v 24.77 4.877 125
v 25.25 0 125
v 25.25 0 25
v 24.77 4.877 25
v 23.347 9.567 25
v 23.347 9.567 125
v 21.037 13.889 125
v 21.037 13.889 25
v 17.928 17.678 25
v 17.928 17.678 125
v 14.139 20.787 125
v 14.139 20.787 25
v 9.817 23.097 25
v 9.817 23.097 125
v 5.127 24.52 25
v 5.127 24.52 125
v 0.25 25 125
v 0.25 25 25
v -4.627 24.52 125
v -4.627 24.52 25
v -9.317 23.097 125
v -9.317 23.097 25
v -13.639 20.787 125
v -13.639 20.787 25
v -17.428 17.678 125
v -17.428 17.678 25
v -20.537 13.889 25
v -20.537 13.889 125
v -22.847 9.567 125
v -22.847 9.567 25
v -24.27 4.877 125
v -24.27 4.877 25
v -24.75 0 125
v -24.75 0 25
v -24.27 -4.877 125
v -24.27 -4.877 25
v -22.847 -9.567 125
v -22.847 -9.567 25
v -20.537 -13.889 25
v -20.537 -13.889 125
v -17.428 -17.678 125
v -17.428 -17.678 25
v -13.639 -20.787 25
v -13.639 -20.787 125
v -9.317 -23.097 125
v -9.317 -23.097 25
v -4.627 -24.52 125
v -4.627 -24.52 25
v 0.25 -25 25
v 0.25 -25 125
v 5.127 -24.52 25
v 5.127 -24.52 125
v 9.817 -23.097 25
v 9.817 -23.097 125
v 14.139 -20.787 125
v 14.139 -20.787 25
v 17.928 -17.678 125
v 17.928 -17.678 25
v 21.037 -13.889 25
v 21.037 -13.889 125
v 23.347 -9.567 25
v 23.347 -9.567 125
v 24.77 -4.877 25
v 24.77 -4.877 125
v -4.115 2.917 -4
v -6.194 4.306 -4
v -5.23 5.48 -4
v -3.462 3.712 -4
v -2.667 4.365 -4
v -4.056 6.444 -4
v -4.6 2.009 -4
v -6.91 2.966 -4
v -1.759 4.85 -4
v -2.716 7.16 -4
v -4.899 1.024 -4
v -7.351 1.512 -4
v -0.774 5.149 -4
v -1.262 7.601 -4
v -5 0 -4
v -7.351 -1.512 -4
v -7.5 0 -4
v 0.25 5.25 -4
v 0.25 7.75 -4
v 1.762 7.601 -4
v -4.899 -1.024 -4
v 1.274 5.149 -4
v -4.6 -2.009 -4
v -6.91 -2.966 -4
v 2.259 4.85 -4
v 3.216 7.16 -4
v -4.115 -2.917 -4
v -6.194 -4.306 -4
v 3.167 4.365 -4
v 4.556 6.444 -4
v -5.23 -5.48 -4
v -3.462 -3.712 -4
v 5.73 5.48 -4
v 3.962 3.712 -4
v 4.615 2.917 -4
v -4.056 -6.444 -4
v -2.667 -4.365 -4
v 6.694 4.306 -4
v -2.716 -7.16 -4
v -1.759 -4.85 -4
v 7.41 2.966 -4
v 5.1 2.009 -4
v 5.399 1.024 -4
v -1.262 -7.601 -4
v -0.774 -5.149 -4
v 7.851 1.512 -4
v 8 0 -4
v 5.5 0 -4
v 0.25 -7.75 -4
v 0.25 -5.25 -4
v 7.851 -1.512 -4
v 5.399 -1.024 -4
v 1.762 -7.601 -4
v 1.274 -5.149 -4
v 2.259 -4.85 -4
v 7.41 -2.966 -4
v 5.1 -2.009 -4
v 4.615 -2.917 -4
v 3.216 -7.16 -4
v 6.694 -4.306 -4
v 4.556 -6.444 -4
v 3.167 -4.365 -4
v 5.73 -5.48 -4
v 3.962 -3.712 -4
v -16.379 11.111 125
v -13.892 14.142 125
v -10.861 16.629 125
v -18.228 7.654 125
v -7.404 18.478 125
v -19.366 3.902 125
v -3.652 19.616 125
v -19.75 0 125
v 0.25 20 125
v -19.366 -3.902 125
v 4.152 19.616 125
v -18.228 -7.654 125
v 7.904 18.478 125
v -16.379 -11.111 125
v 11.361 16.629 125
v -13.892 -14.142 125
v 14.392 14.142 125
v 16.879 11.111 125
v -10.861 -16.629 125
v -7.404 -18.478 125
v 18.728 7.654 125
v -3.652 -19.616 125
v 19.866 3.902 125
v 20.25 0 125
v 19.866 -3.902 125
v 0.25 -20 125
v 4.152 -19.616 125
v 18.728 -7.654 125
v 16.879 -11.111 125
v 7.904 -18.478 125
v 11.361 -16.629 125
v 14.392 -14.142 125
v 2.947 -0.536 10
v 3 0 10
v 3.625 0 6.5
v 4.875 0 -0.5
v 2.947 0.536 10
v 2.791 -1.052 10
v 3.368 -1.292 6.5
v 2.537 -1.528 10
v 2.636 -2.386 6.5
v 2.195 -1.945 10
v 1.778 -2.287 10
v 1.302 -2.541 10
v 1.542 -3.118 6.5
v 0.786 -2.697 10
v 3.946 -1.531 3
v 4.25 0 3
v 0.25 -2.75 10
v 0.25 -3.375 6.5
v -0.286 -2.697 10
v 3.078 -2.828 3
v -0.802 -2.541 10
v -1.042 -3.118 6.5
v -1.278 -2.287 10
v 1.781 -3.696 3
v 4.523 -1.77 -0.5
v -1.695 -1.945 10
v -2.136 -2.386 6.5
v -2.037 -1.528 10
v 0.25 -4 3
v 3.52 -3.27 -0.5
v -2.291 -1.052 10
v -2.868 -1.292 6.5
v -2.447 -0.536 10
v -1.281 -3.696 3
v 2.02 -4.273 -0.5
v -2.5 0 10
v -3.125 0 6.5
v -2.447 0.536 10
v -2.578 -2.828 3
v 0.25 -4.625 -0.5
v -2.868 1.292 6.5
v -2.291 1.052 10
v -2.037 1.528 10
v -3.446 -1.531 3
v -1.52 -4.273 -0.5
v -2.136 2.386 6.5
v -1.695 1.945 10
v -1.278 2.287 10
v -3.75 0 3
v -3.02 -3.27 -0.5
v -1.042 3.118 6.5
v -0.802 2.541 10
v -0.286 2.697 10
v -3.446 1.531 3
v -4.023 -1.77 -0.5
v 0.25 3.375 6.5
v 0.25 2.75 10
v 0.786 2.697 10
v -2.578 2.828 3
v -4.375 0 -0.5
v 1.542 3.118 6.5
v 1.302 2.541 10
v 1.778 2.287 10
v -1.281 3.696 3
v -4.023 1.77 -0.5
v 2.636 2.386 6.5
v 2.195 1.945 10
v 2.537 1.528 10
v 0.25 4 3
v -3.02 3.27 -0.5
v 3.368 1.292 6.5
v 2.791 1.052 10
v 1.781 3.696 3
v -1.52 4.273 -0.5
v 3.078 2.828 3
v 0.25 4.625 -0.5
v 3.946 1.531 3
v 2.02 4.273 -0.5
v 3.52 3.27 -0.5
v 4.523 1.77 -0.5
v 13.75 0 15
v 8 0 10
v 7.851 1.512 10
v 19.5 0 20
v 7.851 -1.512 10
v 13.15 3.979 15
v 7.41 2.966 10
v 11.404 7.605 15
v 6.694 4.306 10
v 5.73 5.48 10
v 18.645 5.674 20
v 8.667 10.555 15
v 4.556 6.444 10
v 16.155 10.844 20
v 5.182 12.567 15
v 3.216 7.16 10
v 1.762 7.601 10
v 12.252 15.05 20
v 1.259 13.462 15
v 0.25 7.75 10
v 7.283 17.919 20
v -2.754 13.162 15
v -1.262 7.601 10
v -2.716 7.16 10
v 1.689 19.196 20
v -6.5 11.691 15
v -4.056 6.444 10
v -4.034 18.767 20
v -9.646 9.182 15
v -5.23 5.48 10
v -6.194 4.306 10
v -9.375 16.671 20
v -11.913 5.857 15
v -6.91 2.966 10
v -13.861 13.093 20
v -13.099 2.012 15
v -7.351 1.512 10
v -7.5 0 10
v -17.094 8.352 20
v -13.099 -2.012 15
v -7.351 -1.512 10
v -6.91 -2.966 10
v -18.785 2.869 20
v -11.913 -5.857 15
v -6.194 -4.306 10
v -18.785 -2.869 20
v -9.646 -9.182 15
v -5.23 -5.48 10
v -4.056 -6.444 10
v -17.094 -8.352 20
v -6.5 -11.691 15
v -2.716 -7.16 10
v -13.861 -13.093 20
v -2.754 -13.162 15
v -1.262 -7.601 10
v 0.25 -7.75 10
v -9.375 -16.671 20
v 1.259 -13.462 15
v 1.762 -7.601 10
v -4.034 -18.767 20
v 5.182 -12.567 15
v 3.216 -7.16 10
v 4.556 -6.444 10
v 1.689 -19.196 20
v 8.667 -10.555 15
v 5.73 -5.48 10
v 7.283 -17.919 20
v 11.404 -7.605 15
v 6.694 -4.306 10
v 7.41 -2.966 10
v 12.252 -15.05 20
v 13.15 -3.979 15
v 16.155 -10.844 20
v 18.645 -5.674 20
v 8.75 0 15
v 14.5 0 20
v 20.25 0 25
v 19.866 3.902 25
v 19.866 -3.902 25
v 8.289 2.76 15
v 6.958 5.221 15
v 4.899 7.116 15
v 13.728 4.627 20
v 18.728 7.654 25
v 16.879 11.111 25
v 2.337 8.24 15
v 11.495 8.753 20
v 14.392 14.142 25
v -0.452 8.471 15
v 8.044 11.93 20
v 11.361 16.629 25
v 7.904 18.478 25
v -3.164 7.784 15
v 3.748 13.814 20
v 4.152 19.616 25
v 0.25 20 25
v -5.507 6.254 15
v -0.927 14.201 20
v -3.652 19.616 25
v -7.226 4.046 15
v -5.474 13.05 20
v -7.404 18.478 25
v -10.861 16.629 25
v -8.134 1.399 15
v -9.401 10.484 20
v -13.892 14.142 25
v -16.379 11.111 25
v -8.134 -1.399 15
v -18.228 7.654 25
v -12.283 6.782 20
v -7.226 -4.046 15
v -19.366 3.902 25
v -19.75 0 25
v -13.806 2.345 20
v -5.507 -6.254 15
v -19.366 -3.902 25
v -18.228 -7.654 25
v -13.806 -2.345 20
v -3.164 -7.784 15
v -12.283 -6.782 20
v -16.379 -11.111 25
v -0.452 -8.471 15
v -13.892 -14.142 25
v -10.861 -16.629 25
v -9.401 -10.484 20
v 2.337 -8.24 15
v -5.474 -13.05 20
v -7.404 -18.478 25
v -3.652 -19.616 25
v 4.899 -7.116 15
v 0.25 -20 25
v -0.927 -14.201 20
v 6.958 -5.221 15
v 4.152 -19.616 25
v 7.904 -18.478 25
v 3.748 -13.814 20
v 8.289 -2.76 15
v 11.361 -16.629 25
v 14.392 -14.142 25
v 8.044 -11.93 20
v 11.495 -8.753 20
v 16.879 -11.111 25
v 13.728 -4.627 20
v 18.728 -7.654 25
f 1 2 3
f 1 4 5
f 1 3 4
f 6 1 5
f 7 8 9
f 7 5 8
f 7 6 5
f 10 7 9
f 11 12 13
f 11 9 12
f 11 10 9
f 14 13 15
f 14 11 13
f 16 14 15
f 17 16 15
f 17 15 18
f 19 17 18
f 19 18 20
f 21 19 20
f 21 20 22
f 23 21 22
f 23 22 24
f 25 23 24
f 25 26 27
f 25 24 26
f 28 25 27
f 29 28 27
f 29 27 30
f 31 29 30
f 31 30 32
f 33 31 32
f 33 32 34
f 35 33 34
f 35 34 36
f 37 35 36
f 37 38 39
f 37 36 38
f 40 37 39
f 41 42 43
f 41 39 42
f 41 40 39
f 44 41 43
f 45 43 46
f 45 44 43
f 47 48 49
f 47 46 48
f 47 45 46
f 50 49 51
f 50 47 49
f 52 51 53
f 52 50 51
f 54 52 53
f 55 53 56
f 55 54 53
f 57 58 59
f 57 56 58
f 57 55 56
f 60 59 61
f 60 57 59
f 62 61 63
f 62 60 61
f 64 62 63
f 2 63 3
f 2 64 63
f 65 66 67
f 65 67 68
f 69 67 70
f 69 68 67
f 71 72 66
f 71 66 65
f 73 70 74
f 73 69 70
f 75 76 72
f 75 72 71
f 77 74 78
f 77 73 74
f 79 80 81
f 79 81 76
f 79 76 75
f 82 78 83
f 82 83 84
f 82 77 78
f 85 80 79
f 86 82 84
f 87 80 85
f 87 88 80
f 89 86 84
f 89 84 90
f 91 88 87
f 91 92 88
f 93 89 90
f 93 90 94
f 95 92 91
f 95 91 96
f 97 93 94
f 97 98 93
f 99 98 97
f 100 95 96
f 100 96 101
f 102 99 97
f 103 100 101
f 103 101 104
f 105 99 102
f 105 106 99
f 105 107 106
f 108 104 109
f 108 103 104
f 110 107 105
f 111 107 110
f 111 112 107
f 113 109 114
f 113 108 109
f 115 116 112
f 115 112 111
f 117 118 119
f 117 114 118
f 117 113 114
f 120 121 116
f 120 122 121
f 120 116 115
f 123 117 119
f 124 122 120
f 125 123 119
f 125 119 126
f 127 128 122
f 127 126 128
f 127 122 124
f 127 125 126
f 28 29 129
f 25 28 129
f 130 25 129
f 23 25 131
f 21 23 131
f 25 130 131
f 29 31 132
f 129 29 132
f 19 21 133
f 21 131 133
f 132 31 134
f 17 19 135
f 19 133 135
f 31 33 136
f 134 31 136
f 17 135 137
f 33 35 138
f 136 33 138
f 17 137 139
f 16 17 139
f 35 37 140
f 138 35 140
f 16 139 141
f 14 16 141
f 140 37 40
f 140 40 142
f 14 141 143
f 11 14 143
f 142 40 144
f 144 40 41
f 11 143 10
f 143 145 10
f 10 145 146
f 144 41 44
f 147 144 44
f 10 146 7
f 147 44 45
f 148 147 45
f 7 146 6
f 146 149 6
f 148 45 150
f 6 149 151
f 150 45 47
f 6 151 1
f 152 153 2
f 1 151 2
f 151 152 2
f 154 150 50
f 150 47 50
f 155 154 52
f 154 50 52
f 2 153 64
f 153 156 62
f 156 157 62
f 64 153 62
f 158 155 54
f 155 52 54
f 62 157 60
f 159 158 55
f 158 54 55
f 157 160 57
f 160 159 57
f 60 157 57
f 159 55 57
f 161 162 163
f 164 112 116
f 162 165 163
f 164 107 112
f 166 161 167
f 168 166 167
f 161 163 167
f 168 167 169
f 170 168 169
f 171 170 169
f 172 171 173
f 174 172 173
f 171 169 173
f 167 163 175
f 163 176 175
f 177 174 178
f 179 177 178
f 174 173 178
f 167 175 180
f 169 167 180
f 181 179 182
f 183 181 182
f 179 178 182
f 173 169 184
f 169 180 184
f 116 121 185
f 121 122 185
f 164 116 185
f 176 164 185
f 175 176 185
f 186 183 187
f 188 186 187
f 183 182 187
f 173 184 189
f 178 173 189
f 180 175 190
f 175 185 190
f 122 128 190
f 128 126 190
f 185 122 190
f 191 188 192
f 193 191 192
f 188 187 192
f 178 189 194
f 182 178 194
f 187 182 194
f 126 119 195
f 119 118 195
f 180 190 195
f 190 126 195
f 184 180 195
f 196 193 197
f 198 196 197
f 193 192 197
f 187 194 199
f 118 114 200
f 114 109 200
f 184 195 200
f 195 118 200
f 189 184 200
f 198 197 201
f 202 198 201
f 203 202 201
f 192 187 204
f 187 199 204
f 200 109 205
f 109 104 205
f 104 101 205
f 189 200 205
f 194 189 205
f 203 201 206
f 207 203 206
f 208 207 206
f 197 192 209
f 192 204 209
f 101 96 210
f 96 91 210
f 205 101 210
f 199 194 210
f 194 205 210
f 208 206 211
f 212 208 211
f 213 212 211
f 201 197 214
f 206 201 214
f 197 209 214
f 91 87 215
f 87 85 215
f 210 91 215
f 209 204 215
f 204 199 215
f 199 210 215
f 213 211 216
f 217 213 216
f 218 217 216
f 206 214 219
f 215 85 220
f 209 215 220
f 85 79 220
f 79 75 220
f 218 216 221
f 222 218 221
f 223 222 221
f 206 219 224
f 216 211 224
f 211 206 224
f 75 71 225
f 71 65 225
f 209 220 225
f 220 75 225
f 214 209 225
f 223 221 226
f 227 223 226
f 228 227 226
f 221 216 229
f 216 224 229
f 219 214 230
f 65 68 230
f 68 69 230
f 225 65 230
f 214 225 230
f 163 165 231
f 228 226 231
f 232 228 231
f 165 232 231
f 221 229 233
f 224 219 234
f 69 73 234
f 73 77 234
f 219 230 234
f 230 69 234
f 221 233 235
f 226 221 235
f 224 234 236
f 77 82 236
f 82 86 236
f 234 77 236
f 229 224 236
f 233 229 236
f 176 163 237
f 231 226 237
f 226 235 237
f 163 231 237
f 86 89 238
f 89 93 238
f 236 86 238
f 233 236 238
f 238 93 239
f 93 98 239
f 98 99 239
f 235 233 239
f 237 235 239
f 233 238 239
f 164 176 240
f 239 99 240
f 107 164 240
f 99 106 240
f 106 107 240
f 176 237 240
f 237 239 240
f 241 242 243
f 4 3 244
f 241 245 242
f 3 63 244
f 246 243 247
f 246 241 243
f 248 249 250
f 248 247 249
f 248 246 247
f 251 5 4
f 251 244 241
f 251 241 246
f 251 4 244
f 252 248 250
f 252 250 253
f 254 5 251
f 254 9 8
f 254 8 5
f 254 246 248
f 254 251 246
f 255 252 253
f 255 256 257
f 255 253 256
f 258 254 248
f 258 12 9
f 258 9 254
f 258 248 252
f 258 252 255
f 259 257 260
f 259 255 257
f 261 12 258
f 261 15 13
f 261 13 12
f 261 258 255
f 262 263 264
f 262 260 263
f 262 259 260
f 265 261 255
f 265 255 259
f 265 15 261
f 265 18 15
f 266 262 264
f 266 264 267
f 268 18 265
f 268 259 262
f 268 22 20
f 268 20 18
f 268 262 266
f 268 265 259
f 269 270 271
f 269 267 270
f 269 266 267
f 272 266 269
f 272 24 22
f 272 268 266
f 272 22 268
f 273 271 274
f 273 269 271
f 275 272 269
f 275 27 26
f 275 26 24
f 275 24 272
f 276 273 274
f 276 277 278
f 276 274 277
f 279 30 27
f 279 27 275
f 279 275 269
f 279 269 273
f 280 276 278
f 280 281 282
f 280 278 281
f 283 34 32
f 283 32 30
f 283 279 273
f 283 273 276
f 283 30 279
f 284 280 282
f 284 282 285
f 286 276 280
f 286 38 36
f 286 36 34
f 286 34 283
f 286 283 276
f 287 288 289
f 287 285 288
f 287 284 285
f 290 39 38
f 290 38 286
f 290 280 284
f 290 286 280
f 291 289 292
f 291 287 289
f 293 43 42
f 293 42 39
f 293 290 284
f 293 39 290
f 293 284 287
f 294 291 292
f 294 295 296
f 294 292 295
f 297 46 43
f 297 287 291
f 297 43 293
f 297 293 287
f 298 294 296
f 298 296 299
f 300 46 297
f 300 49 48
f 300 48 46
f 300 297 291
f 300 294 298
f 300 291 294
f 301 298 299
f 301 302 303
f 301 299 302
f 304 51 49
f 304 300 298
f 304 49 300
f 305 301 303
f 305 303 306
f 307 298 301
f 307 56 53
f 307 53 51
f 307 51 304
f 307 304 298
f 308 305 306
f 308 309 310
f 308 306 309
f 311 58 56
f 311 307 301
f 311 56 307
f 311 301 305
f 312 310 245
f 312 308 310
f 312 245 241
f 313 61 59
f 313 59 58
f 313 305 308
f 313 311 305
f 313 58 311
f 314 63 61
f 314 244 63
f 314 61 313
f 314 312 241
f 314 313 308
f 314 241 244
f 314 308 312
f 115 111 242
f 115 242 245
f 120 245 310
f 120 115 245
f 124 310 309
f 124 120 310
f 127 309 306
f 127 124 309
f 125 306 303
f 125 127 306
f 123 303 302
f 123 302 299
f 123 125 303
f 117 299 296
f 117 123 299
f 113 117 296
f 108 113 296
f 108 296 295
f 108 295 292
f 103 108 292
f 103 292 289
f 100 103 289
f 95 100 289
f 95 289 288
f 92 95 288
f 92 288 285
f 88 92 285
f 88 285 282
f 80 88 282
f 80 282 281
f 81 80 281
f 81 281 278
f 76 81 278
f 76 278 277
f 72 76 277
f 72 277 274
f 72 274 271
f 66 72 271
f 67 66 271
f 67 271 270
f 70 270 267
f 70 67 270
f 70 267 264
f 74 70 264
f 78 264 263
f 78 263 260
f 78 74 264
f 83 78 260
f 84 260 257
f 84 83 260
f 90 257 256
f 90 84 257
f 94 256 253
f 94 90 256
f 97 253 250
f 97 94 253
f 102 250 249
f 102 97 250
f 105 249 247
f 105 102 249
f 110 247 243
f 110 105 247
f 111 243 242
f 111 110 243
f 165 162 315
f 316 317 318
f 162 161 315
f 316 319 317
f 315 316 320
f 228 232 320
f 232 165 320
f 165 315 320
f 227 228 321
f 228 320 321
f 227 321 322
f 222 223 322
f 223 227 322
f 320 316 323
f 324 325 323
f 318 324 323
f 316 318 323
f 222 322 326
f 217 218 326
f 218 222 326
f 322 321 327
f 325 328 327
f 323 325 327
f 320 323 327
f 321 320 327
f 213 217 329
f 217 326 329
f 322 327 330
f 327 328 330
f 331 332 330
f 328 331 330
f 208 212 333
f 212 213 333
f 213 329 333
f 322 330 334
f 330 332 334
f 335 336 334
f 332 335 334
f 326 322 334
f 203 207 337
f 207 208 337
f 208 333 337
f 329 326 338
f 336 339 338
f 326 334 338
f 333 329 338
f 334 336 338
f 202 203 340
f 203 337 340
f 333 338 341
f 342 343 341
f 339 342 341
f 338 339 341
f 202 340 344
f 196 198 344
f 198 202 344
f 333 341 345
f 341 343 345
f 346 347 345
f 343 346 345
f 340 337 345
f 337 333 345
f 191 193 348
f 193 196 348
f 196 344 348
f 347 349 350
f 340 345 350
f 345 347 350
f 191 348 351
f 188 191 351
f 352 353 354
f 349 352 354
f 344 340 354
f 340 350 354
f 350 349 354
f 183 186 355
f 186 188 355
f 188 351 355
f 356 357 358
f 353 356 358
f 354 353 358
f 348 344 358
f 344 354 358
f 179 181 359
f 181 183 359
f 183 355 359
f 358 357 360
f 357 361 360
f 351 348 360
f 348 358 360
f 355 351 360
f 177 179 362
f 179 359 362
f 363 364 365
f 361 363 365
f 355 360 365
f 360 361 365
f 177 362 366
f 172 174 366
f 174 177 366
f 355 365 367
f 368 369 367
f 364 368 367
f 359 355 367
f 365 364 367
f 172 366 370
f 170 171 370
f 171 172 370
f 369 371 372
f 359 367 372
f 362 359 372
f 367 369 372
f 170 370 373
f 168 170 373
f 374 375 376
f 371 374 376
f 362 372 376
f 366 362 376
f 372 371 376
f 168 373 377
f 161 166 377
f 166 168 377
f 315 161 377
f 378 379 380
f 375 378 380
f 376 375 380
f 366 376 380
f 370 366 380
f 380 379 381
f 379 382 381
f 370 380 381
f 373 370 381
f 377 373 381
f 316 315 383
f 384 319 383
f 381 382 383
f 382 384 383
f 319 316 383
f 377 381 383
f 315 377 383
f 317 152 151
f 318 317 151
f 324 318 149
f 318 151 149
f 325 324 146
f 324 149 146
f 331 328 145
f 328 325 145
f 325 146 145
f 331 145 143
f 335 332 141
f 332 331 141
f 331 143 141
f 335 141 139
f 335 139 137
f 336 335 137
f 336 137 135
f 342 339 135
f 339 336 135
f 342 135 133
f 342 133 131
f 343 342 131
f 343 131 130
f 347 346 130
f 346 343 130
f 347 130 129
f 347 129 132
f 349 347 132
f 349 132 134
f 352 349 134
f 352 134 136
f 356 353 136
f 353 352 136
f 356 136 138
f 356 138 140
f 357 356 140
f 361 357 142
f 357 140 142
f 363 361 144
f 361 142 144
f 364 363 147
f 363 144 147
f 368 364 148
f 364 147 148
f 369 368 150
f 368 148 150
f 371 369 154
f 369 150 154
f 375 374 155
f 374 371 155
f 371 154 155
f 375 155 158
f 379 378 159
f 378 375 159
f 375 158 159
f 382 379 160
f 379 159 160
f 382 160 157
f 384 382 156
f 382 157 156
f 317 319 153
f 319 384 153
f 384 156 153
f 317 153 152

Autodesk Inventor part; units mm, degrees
ref_plane "YZ Plane" through (0, 0, 0) normal (1, 0, 0) x (0, 1, 0)
ref_plane "XZ Plane" through (0, 0, 0) normal (0, 1, 0) x (-1, 0, 0)
ref_plane "XY Plane" through (0, 0, 0) normal (0, 0, 1) x (1, 0, 0)
sketch "Esquisse3" plane through (0, 0, 0) normal (0, 1, 0) x (-1, 0, 0)
  line L0 (-0.25, 6.0789) -> (-0.25, -5.5)
  line L1 (-8, 10) -> (-8, -4)
  line L2 (-8, -4) -> (-5.5, -4)
  line L3 (-5.5, -4) -> (-3, 10)
  line L4 (-3, 10) -> (-8, 10)
  line L5 (0, -31.6) -> (0, 151.1) construction
  line L6 (5.05, 0) -> (-30.3, 0) construction
  line L7 (-3, 10) -> (-20.25, 25)
  line L8 (-20.25, 25) -> (-20.25, 125)
  line L9 (-8, 10) -> (-25.25, 25)
  line L10 (-25.25, 25) -> (-25.25, 125)
  line L11 (-25.25, 125) -> (-20.25, 125)
  line L12 (-30.3, 0) -> (5.05, 0) construction
  point P0 (0, 0)
  dimension "d0" = 5.5
  dimension "d1" = 10.5
  dimension "d2" = 15.5
  dimension "d3" = 14
  dimension "d4" = 8
  dimension "d5" = 10
  dimension "d9" = 40
  dimension "d10" = 15
  dimension "d11" = 100
  dimension "d13" = 5
  dimension "d14" = 5
  dimension "d15" = 125
revolve "Révolution1" add sketch "Esquisse3" angle 360 about axis through (0.25, 0, 6.0789) along (0, 0, -1)
properties part number "P006_CanonConfettis"
